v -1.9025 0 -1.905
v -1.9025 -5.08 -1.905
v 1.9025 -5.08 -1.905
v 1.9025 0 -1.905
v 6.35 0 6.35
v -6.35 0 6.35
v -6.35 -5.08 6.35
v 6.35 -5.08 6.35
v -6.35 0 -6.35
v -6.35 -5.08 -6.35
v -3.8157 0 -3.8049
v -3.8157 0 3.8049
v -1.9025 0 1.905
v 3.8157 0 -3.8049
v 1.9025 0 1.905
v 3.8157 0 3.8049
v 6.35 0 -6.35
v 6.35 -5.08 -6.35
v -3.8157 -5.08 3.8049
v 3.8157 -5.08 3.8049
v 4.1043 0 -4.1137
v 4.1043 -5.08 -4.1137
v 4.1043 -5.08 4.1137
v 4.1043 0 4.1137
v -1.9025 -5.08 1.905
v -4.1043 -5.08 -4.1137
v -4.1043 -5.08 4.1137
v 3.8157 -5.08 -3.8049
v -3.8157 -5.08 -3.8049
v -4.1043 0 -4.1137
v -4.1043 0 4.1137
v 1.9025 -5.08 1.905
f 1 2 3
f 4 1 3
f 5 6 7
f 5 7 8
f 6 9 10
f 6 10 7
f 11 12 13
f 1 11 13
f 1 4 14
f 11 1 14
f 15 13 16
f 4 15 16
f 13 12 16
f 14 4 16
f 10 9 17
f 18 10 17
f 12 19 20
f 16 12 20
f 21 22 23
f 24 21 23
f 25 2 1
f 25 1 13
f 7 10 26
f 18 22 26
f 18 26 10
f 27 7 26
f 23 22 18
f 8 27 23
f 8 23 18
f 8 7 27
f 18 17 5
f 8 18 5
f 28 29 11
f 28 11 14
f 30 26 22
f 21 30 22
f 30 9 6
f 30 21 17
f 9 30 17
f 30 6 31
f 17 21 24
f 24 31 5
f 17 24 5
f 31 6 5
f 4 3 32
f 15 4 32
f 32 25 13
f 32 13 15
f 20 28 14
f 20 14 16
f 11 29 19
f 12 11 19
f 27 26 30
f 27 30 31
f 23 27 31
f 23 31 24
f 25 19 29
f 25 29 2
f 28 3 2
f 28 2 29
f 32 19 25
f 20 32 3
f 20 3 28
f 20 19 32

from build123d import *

# Parameters (mm, degrees)
F0_W     = 12.7
F0_H     = 12.7
F1_DEPTH = 5.08
F3_W     = 3.80499
F3_H     = 3.81
F5_DEPTH = 25.4
F4_W     = 8.208692
F4_H     = 8.22731
F4_W_2   = 7.631382
F4_H_2   = 7.60988
F6_DEPTH = 25.4


with BuildPart() as f1:
    # F0 (on Front) → F1 (new body)
    with BuildSketch(Plane.XZ):
        Rectangle(F0_W, F0_H)
    extrude(amount=F1_DEPTH)

    # F3 (on face) → F5 (cut)
    with BuildSketch(Plane.XZ.offset(5.08)):
        Rectangle(F3_W, F3_H)
    extrude(amount=-F5_DEPTH, mode=Mode.SUBTRACT)

    # F4 (on face) → F6 (cut)
    with BuildSketch(Plane.XZ.offset(5.08)):
        Rectangle(F4_W, F4_H)
        Rectangle(F4_W_2, F4_H_2, mode=Mode.SUBTRACT)
    extrude(amount=-F6_DEPTH, mode=Mode.SUBTRACT)


solid = f1.part
